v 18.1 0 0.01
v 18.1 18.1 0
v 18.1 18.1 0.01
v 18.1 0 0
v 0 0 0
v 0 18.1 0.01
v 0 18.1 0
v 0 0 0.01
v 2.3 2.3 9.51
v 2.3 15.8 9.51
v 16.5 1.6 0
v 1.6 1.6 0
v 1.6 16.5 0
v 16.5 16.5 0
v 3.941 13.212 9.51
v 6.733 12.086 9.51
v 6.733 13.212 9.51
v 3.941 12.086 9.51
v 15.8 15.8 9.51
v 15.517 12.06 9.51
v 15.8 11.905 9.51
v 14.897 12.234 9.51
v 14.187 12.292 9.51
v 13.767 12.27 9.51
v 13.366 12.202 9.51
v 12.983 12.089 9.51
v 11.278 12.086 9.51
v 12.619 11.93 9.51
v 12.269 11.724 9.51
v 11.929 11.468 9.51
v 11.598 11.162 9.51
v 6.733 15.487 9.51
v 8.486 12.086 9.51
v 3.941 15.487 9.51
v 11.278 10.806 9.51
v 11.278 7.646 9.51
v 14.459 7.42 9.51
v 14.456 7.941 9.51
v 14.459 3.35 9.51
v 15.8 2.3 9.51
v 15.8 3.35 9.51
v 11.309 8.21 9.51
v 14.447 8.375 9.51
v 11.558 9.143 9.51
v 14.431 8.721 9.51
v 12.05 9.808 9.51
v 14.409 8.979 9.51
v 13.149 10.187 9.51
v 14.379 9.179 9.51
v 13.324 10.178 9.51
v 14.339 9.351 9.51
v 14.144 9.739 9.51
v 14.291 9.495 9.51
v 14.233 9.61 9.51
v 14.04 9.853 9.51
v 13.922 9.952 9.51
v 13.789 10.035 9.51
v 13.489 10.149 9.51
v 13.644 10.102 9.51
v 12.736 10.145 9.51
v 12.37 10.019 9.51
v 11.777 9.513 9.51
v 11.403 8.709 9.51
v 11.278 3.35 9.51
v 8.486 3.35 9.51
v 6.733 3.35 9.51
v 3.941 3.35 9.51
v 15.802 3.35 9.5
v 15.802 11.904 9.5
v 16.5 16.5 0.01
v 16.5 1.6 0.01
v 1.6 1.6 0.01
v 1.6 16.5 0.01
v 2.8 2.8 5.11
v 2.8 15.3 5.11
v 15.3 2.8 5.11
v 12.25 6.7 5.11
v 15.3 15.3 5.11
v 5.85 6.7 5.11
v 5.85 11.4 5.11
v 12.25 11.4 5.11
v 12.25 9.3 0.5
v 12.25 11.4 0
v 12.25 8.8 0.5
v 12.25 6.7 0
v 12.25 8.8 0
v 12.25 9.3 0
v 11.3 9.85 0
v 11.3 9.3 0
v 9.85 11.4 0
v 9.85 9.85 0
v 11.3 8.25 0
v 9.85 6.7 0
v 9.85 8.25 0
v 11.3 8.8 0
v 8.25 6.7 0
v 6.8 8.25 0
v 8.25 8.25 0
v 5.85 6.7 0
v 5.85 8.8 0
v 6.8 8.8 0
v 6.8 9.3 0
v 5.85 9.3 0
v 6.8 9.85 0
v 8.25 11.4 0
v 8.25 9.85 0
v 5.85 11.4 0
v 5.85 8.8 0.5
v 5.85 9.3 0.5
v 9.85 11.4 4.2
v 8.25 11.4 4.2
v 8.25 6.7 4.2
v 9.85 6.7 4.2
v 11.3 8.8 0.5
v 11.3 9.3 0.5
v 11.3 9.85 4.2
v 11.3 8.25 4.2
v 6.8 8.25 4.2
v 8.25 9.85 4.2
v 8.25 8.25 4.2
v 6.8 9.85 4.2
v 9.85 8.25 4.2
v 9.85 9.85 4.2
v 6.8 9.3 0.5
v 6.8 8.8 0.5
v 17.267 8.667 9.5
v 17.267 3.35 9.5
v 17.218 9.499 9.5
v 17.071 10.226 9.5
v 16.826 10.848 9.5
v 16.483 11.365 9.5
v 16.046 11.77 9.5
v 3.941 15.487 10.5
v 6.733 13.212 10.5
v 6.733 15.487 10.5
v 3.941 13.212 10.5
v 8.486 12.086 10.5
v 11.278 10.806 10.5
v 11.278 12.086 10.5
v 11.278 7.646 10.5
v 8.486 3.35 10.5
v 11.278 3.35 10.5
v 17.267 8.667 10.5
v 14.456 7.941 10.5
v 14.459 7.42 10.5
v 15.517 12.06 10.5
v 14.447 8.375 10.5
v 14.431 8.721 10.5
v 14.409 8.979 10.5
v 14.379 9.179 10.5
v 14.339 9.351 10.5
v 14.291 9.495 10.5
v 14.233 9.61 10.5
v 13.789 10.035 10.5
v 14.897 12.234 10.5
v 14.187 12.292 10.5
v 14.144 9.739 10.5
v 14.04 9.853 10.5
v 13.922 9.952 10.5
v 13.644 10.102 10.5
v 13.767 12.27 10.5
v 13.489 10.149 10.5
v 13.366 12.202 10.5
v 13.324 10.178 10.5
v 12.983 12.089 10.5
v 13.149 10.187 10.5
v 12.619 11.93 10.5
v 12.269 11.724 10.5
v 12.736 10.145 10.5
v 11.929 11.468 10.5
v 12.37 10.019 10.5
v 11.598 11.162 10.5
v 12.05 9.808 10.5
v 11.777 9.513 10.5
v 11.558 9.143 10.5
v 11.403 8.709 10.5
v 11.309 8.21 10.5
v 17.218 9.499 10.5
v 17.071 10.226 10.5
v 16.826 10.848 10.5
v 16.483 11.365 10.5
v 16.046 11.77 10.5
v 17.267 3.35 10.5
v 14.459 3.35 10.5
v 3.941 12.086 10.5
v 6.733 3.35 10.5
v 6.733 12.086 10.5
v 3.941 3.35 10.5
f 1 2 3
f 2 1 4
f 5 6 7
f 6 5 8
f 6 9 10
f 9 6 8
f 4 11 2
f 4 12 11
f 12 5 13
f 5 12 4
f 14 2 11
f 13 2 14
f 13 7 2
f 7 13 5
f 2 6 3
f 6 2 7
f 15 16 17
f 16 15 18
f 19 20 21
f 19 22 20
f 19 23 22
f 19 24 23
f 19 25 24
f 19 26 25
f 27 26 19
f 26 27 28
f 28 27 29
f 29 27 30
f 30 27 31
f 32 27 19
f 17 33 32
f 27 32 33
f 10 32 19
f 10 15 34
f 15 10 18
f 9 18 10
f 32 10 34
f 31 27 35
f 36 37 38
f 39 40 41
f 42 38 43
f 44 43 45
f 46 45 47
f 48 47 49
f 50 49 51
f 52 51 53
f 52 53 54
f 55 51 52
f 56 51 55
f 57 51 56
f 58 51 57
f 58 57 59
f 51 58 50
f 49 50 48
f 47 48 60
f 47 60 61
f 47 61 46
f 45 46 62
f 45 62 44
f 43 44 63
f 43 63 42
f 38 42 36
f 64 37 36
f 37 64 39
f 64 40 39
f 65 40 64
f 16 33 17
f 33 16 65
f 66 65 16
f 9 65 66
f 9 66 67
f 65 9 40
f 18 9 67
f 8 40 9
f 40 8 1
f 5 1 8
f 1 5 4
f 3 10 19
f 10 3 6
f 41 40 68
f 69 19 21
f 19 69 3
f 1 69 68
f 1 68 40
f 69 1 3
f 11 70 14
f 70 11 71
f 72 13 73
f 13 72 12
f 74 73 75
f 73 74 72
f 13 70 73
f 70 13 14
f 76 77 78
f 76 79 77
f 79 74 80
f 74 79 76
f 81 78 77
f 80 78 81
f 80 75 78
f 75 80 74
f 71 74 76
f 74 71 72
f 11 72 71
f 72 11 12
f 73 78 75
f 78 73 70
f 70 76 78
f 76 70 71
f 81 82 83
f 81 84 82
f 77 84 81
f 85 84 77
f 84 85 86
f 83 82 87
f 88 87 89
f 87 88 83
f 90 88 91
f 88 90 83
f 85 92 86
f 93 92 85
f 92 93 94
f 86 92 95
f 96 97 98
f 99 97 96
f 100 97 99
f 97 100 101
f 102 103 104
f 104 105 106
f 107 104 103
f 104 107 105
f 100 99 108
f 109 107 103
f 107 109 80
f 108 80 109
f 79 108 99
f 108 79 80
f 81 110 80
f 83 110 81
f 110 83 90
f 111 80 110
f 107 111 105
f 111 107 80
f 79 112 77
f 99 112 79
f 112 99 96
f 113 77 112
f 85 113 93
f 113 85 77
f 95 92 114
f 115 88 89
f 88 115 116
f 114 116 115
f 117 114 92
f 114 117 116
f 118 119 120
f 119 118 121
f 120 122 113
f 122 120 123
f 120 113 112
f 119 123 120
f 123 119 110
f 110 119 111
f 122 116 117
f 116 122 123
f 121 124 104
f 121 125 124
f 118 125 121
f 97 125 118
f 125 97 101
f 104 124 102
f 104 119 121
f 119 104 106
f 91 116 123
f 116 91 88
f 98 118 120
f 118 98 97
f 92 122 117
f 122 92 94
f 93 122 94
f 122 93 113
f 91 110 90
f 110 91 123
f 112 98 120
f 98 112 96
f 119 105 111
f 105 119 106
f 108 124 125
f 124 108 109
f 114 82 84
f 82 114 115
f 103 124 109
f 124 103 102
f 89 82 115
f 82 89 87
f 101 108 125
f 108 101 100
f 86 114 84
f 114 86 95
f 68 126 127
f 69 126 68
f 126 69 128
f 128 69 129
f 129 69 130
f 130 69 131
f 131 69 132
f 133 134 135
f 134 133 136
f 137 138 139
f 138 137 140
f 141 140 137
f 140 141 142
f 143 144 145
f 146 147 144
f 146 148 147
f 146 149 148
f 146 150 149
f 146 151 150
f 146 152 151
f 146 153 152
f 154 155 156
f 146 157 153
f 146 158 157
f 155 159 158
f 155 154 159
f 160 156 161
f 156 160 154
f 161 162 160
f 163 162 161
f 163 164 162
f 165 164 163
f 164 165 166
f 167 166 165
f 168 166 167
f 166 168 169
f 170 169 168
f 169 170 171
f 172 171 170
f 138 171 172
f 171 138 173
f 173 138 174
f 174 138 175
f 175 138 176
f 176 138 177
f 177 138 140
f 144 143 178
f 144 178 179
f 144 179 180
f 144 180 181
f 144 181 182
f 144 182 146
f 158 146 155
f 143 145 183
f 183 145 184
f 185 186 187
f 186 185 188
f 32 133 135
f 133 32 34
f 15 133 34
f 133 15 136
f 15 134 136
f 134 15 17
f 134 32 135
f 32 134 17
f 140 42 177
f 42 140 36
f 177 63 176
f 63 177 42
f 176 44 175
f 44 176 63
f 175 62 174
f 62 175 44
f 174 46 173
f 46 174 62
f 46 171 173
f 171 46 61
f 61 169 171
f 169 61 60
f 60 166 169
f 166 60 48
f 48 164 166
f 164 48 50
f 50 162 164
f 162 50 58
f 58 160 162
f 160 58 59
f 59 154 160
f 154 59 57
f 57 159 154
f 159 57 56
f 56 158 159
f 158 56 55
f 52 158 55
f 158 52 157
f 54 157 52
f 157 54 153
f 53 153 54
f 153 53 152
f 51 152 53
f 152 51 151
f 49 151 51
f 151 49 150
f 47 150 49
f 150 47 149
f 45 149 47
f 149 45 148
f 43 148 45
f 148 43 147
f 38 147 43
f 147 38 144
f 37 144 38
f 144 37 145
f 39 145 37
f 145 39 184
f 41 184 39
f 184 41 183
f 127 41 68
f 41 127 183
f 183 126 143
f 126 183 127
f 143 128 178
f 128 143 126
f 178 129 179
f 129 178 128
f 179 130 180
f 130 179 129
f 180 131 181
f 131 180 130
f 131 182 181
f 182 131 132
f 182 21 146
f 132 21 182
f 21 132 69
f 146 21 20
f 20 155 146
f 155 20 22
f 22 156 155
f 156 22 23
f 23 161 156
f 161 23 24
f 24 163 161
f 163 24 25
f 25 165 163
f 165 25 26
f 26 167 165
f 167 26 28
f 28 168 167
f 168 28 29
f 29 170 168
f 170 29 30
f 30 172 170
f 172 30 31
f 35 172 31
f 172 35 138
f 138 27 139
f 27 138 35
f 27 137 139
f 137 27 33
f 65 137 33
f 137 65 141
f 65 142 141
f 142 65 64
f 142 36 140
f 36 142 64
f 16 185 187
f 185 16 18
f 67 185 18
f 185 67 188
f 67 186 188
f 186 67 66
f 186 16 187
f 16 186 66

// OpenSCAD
b_w = 18.1;
b_l = 18.1;
t_w = 13.5;
t_l = 13.5;
h = 9.5;

shell = 1.6;
stem_offset = 3.9;

difference(){
    hull(){
      cube([b_w,b_l,0.01]);
      translate([(b_w-t_w)/2,(b_w-t_l)/2,h]){
          cube([t_w,t_l,0.01]);
      }
    }
    translate([shell,shell,0]){
        hull(){
          cube([b_w-2*shell,b_l-2*shell,0.01]);
          translate([(b_w-t_w+1-2*shell)/2,(b_w-t_l+1-2*shell)/2,stem_offset+1.2]){
              cube([t_w-1,t_l-1,0.01]);
          }
        }
    }
}

difference(){
//    translate([b_w/2,b_l/2,0]) cylinder(d=5.5, h=h-0.1, $fn=240);
    translate([(b_w-6.4)/2,(b_l-4.7)/2,0]) cube([6.4,4.7,h-0.1]);

    //cross
    translate([(b_w-4.5)/2,(b_l-1.6)/2,0]) cube([4.5,1.6,stem_offset+0.3]);
    translate([(b_w-1.6)/2,(b_l-5)/2,0]) cube([1.6,5,stem_offset+0.3]);
    
    //dot cutout for some switches
    translate([(b_w-8)/2,(b_l-0.5)/2,0]) cube([8,0.5,0.5]);

}

translate([2.6,3.35,h]) linear_extrude(1) text("in",spacing=.85,size=11.5,font="Source Sans Pro:style=Bold");

//cube([b_w,b_l,0.2]);
